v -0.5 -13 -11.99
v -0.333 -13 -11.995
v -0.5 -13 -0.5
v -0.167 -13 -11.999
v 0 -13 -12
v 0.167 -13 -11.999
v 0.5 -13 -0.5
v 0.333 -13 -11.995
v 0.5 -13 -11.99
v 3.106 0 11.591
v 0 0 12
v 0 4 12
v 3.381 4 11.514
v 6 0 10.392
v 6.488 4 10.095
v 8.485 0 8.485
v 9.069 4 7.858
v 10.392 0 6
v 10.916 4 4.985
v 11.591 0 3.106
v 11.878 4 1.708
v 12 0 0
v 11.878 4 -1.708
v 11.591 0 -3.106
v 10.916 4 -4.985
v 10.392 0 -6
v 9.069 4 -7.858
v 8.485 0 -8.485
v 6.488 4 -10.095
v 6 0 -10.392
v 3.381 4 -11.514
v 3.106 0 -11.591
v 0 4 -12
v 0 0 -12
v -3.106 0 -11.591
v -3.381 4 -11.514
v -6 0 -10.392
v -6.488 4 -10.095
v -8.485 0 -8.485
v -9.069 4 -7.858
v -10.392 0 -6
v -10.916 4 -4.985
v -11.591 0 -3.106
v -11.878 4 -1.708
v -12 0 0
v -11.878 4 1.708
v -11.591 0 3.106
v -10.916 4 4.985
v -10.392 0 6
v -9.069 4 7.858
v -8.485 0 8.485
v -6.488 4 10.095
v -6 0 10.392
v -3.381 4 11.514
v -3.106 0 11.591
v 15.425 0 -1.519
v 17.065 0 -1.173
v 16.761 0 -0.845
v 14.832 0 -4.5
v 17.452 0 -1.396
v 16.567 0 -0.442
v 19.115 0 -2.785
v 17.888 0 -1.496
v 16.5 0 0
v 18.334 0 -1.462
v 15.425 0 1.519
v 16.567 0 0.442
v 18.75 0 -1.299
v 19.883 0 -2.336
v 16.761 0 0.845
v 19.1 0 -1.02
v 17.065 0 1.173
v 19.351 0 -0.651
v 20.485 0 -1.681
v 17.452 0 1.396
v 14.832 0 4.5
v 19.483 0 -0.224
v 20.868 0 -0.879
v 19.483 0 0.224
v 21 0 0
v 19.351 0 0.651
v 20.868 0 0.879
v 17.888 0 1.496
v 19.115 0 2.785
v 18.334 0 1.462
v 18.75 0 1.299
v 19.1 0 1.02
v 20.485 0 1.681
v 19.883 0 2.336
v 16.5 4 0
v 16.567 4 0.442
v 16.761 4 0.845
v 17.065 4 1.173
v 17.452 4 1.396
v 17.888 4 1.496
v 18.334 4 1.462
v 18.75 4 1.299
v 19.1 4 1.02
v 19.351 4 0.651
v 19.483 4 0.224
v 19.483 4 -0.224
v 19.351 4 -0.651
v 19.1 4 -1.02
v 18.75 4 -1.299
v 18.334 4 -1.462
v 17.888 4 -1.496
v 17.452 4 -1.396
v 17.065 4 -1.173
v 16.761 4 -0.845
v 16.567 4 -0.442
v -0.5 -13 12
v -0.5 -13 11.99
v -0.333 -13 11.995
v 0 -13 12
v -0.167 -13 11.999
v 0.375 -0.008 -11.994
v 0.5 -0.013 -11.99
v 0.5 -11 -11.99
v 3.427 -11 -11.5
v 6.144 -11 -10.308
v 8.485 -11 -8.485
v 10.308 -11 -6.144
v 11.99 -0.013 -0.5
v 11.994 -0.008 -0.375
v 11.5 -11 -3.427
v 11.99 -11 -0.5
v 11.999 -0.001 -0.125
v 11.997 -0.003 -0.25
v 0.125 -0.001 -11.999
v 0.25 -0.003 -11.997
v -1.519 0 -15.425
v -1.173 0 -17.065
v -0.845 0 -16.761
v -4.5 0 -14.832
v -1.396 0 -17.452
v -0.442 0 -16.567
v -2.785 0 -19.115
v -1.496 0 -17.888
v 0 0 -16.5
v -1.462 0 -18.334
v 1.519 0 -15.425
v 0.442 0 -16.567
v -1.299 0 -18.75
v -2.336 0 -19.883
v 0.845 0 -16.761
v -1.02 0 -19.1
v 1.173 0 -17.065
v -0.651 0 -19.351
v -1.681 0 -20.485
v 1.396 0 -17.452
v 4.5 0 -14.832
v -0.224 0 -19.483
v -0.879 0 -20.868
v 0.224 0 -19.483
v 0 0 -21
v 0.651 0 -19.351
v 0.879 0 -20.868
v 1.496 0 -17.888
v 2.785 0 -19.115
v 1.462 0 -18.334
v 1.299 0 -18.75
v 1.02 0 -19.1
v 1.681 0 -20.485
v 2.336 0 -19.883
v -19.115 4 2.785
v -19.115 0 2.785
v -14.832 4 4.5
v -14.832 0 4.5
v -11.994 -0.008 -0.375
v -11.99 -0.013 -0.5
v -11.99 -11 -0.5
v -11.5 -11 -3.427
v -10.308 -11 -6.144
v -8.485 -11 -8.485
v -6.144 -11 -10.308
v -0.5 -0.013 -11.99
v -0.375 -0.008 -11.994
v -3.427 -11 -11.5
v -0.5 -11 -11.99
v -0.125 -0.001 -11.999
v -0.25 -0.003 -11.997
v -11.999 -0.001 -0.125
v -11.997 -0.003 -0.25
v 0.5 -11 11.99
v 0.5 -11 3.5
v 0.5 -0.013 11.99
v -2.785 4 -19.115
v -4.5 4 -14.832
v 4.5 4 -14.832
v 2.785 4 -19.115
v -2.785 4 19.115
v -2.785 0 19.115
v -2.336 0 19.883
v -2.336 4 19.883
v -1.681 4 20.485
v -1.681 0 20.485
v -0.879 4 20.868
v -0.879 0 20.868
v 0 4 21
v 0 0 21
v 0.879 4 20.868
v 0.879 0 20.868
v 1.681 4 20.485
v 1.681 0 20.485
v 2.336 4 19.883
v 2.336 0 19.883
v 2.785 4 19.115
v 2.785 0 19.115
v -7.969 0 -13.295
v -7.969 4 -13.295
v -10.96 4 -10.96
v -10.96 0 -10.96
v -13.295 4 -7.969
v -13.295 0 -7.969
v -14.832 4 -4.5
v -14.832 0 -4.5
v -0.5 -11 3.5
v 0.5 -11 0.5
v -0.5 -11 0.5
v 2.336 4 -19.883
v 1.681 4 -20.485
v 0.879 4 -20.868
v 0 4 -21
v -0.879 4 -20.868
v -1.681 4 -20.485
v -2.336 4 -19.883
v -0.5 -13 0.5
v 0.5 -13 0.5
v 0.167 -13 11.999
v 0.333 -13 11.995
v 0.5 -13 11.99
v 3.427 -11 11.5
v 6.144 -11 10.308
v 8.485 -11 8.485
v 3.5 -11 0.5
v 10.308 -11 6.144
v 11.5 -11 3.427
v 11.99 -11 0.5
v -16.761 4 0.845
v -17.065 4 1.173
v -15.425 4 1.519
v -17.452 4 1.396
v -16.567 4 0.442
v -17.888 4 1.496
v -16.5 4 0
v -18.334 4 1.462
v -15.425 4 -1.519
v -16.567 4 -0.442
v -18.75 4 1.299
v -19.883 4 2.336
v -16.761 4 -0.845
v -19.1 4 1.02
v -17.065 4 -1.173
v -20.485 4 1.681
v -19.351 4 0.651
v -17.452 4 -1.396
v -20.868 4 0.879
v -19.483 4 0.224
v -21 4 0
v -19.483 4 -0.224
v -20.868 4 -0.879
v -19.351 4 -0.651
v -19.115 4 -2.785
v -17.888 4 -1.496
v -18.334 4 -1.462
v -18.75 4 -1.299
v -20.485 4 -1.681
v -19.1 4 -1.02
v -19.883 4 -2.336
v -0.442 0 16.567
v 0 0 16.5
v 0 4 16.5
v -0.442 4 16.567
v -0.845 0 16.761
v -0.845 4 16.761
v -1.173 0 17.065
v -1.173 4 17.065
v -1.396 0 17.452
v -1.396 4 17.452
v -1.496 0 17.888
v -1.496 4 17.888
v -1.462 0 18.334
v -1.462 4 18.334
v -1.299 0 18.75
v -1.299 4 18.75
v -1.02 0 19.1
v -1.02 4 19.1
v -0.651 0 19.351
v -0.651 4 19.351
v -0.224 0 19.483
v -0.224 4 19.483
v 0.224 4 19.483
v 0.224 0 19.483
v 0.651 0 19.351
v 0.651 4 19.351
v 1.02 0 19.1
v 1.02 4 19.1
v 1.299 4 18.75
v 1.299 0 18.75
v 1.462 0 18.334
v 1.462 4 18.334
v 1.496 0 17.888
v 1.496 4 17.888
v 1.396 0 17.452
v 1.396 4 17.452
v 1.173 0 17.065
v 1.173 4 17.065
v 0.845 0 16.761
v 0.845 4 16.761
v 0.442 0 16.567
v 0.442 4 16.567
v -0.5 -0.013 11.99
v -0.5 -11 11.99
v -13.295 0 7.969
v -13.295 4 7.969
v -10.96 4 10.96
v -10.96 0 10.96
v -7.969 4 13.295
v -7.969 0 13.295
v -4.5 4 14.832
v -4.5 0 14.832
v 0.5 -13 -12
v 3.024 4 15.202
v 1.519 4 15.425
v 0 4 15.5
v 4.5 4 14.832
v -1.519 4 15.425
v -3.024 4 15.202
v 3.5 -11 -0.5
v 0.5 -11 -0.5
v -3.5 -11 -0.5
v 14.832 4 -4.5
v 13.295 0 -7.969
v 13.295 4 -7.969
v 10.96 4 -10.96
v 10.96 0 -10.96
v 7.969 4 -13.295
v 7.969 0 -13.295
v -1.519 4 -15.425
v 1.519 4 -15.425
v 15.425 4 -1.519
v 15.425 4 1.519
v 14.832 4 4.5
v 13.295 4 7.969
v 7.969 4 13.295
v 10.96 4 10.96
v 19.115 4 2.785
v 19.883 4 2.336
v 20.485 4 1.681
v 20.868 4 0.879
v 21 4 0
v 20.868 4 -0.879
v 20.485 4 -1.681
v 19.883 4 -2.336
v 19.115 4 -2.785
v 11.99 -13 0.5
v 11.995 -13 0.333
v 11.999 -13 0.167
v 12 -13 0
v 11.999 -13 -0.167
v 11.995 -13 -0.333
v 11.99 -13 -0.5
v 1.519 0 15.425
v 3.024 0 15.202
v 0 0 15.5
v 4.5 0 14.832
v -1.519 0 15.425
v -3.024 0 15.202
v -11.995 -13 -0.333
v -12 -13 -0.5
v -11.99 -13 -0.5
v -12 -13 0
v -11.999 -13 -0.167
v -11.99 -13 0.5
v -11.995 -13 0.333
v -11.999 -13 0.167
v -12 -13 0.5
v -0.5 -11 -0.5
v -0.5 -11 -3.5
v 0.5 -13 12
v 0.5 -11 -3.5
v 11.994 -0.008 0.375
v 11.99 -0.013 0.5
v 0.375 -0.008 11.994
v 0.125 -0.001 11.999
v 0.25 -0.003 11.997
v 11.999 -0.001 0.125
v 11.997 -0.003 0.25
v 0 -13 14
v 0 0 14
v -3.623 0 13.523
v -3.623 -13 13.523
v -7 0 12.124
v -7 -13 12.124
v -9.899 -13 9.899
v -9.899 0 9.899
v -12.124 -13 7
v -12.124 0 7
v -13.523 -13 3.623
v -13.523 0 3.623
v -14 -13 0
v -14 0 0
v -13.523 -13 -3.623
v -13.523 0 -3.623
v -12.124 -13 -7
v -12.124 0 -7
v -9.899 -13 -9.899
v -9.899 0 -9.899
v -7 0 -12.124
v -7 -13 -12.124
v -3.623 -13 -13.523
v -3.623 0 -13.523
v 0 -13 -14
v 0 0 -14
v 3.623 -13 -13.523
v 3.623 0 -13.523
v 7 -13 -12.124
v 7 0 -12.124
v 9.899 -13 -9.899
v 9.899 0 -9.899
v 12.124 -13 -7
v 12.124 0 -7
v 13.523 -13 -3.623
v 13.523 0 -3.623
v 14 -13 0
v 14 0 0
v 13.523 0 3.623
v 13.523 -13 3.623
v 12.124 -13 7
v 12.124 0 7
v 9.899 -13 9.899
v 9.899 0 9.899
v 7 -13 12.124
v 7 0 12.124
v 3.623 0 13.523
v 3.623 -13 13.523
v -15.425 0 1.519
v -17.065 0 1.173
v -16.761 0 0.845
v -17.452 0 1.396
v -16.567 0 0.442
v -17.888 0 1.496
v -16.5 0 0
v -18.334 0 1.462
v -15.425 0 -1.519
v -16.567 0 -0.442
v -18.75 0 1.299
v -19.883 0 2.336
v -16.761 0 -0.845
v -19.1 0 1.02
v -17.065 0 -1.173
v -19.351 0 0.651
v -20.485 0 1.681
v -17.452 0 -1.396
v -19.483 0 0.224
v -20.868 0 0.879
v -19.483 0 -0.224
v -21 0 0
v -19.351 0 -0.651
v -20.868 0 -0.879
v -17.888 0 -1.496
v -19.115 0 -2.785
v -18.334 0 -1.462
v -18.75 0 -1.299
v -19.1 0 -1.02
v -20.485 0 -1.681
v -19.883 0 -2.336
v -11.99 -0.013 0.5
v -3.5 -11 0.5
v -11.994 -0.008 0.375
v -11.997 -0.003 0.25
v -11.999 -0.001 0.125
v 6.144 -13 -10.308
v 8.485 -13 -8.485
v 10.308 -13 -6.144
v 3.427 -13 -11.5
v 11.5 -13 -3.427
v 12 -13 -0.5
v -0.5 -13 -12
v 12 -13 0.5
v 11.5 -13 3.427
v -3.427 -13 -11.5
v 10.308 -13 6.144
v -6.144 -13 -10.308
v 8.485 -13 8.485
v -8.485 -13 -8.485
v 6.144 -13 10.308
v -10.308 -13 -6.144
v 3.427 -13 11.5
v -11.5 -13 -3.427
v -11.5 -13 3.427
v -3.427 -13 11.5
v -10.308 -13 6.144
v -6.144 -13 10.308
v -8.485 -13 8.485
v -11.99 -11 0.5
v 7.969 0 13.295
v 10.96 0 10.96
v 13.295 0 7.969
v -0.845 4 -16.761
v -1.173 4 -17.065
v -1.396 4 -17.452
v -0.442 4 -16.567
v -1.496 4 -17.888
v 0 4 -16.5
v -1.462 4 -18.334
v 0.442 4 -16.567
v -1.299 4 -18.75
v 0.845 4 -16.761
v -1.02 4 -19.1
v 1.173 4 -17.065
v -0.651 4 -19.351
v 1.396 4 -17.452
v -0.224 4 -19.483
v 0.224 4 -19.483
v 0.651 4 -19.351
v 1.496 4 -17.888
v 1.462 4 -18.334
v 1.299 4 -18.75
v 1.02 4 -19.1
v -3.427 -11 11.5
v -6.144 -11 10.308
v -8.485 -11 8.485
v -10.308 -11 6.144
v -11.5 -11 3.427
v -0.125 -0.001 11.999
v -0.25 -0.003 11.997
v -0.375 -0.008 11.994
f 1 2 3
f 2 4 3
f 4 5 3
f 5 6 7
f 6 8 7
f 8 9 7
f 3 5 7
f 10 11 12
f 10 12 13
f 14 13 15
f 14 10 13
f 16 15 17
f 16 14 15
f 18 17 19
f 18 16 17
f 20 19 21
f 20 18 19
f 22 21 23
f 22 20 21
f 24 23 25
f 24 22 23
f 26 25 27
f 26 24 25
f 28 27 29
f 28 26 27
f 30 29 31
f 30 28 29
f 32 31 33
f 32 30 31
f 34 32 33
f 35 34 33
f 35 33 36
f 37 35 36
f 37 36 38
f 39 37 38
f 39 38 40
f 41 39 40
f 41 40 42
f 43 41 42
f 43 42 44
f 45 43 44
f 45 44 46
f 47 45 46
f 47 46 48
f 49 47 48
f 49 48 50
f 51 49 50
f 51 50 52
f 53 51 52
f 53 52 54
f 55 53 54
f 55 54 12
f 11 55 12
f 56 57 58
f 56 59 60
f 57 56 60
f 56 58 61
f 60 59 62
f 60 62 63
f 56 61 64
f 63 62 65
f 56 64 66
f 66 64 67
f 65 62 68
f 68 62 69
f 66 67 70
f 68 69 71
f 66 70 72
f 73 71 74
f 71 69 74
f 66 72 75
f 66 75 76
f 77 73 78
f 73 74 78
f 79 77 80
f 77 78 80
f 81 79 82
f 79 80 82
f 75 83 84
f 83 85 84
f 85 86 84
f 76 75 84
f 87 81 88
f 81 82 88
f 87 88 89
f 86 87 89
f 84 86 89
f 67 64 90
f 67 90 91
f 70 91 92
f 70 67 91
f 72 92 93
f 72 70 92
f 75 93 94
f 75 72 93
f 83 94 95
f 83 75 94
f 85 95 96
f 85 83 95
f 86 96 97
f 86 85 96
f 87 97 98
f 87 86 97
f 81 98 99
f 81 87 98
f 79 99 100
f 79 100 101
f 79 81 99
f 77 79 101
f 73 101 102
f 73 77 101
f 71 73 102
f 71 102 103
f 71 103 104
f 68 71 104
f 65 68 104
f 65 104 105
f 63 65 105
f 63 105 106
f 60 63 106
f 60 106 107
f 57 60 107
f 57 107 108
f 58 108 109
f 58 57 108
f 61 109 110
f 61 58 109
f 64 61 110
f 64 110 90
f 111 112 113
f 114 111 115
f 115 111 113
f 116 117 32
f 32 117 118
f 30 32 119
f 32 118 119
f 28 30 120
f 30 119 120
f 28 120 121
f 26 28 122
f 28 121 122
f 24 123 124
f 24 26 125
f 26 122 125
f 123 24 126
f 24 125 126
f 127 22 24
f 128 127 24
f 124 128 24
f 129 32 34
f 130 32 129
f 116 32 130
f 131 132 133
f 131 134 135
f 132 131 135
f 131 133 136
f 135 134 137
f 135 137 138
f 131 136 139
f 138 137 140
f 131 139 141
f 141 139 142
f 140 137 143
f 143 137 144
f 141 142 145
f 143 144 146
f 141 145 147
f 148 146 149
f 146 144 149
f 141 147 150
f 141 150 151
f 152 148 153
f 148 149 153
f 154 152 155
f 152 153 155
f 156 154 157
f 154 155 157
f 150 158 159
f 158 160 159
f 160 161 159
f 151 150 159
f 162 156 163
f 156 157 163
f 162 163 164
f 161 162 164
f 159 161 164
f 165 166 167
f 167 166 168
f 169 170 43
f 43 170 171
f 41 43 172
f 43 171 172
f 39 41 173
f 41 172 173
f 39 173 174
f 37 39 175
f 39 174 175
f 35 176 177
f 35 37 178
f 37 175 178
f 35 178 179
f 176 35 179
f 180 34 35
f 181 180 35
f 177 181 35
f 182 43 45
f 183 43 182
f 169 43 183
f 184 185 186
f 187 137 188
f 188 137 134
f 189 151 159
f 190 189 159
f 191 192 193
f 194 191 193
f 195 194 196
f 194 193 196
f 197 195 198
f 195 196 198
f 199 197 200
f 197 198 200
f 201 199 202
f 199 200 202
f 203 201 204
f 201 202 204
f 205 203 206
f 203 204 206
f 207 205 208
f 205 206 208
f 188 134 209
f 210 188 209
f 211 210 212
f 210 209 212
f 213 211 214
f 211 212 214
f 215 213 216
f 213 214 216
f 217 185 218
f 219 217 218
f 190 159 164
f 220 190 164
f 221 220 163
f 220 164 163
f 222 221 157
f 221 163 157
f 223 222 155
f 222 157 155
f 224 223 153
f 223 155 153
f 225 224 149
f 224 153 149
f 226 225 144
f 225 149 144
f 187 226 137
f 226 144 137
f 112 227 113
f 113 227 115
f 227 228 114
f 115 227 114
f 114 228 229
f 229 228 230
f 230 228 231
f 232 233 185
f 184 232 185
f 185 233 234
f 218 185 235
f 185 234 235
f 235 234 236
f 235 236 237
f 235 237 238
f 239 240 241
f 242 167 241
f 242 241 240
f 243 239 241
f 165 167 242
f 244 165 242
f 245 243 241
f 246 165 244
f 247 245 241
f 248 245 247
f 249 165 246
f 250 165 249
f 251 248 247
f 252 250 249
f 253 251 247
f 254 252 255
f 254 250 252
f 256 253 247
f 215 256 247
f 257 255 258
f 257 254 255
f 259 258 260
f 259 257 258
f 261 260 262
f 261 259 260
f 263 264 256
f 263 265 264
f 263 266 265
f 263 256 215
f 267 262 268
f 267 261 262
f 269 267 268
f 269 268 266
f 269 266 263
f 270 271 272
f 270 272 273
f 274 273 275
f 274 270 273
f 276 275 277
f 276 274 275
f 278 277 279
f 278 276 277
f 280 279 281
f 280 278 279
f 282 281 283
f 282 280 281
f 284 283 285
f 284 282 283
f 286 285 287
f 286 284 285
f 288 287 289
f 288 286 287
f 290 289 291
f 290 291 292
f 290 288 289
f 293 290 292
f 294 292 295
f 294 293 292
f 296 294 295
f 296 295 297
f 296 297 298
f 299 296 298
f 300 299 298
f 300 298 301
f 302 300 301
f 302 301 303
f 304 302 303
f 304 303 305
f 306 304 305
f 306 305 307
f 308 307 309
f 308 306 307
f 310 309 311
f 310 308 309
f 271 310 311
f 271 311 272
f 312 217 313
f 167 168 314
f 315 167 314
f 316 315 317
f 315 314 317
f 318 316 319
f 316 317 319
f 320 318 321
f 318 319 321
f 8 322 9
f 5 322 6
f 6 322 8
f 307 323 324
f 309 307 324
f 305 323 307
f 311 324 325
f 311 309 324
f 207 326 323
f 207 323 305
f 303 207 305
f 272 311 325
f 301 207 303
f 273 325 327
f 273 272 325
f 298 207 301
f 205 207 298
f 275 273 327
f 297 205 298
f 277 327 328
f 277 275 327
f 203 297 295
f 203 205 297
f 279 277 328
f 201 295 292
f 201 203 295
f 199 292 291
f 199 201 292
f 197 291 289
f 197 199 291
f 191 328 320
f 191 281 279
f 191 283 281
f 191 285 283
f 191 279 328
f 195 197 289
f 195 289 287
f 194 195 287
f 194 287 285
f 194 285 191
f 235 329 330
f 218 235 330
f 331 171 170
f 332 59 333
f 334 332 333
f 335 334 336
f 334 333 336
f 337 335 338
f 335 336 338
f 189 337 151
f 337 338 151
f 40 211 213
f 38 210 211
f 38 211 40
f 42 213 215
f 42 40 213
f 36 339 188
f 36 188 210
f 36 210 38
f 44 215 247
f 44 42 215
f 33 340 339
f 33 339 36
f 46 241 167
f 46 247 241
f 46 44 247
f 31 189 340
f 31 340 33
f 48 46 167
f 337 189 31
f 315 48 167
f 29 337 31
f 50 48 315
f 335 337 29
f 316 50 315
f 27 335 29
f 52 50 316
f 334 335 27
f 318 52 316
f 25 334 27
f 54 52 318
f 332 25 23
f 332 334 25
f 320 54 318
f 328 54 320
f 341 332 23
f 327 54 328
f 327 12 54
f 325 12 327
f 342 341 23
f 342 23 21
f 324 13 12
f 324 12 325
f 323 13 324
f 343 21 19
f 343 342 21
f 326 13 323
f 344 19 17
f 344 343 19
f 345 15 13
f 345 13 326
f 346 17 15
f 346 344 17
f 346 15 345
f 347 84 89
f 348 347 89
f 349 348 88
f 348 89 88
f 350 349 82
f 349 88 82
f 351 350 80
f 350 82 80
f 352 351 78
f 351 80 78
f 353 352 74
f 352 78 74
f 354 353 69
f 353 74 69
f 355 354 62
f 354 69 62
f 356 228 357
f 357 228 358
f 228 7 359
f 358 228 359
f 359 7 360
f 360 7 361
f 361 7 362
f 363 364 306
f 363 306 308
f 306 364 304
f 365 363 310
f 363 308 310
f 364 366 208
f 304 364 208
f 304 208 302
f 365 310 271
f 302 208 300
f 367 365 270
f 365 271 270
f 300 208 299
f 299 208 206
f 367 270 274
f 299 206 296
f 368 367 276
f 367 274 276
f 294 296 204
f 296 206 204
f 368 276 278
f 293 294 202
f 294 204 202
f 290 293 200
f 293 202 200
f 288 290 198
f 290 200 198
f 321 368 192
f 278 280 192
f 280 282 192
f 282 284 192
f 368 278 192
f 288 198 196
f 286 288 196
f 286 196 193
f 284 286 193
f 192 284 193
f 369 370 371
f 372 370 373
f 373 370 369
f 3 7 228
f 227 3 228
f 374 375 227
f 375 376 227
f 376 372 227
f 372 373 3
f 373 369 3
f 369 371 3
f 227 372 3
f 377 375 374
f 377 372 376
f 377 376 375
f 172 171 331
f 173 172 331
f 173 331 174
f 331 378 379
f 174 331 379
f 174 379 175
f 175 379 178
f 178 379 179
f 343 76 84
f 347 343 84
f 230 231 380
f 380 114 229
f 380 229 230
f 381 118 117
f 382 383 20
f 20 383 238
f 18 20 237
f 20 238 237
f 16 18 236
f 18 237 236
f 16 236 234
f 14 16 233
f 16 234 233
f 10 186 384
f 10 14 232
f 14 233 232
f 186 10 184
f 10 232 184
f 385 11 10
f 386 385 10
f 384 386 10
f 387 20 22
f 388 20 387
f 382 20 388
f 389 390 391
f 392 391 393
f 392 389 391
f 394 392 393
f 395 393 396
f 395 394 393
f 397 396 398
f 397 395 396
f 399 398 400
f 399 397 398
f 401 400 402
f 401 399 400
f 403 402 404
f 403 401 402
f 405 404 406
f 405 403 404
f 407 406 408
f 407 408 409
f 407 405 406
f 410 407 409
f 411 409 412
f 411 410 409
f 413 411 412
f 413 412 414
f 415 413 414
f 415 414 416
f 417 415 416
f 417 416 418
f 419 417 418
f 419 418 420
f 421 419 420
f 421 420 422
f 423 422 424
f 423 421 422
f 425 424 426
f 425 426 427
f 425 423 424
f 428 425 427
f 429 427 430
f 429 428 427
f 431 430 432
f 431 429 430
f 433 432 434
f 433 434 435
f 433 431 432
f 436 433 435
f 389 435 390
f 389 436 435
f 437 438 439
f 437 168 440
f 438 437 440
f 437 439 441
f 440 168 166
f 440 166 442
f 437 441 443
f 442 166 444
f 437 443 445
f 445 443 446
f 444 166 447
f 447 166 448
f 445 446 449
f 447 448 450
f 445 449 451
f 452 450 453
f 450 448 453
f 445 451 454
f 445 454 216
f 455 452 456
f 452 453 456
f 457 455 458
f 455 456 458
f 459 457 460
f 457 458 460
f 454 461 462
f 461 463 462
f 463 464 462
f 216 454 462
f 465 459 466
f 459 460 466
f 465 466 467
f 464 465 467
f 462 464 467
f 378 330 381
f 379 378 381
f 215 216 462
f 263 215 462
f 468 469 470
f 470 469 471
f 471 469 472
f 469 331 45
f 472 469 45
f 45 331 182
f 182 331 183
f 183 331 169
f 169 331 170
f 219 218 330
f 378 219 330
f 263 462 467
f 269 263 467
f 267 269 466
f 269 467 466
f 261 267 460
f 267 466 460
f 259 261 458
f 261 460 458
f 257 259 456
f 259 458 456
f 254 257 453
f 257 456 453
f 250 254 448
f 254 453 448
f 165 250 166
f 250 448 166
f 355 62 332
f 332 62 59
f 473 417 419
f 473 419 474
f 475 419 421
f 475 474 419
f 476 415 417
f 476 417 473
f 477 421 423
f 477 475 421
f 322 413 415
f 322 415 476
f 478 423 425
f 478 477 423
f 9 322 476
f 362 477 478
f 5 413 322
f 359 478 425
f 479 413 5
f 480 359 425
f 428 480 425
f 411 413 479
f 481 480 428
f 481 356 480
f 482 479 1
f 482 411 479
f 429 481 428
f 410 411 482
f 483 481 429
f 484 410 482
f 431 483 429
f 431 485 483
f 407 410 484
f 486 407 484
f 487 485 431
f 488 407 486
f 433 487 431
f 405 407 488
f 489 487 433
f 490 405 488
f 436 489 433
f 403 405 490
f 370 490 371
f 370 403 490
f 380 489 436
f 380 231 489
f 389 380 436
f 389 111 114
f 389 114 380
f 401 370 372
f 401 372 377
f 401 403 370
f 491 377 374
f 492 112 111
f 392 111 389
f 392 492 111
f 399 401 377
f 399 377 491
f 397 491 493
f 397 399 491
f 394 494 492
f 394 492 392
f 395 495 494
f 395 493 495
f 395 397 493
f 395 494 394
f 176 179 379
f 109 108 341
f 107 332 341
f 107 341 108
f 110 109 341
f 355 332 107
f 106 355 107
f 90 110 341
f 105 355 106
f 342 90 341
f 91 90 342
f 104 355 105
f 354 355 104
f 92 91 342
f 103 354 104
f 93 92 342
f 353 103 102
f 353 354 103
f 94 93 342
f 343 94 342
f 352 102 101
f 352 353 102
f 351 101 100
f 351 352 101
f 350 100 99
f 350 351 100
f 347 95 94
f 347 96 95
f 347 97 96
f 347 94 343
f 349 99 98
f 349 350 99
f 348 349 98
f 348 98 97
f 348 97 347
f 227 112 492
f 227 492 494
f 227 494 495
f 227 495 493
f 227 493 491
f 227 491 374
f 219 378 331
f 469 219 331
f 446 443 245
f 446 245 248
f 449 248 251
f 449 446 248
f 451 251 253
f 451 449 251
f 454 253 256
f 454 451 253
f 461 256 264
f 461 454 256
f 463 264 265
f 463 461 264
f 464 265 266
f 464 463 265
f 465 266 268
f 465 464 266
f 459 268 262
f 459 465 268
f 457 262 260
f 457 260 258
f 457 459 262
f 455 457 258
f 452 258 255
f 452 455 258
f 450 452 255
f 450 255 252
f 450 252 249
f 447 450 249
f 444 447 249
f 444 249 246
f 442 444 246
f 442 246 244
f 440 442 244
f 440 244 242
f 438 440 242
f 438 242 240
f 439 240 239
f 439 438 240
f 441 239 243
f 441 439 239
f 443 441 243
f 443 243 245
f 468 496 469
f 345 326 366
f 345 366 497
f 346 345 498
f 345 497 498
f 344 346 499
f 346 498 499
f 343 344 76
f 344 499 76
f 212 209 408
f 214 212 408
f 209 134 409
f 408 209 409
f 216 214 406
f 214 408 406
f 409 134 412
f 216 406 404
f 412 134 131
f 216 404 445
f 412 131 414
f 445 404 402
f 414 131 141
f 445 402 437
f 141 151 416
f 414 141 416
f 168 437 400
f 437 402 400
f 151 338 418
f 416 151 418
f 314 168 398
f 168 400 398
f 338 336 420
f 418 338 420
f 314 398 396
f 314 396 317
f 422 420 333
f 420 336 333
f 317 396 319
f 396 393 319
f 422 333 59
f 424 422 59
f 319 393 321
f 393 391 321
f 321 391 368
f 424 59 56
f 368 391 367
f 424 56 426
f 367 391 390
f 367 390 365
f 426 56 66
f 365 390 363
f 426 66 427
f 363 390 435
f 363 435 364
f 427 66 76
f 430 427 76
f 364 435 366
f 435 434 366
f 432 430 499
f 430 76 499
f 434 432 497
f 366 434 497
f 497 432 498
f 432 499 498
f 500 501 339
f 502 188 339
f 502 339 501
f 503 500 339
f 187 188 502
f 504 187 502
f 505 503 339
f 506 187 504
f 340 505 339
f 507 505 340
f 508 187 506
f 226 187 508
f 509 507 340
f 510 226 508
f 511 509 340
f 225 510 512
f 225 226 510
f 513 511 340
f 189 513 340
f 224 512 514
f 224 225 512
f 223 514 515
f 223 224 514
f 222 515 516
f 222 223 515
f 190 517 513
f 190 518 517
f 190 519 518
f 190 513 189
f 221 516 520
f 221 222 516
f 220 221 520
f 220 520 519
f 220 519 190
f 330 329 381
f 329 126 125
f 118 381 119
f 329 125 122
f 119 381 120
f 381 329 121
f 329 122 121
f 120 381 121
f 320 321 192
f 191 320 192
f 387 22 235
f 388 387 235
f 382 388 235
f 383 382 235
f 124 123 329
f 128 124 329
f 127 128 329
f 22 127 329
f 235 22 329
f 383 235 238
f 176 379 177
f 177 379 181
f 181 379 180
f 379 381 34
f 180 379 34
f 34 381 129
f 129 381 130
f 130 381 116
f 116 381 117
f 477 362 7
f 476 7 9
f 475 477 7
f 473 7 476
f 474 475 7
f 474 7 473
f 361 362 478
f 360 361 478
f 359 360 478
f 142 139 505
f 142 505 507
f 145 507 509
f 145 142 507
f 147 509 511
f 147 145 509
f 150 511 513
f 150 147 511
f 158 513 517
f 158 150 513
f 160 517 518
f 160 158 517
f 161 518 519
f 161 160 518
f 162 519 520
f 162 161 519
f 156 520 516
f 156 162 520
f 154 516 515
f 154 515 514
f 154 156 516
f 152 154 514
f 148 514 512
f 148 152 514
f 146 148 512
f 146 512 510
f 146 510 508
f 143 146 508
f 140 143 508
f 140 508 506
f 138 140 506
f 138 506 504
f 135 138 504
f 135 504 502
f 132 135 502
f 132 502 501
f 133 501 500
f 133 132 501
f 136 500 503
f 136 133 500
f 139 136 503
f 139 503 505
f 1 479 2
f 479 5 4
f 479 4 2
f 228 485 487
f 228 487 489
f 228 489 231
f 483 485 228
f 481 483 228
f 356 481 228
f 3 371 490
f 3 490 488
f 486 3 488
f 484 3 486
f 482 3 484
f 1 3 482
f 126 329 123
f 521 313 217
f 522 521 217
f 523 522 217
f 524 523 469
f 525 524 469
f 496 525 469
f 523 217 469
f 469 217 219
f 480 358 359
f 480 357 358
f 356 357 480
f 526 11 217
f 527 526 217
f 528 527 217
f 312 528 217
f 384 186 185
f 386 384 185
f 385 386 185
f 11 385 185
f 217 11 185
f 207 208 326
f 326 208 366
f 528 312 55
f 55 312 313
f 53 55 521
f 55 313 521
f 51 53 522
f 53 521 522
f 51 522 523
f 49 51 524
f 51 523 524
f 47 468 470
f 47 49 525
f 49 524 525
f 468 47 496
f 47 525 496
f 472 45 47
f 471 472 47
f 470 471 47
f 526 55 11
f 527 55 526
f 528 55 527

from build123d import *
from build123d.topology import SkipClean

# Parameters (mm, degrees)
SKETCH1_R           = 15.5
SKETCH1_R_2         = 12
BOSS_EXTRUDE1_DEPTH = 4
BOSS_EXTRUDE2_START = 13
SKETCH2_R           = 14
SKETCH2_R_2         = 12
BOSS_EXTRUDE2_DEPTH = 13
BOSS_EXTRUDE3_DEPTH = 0.5
CIRPATTERN1_COUNT   = 4
BOSS_EXTRUDE4_START = -4
SKETCH4_R           = 1.5
BOSS_EXTRUDE4_DEPTH = 4
CIRPATTERN2_COUNT   = 4
SKETCH5_R           = 12
BOSS_EXTRUDE5_DEPTH = 2


with BuildPart() as part:
    # Sketch1 → Boss-Extrude1 (new body)
    with BuildSketch(Plane(origin=(0, 0, 0), x_dir=(1, 0, 0), z_dir=(0, 1, 0))):
        with Locations(Location((0, 0, 0), (0, 0, 270))):
            Circle(SKETCH1_R)
        with Locations(Location((0, 0, 0), (0, 0, 270))):
            Circle(SKETCH1_R_2, mode=Mode.SUBTRACT)
    extrude(amount=BOSS_EXTRUDE1_DEPTH)

    # Sketch2 → Boss-Extrude2 (add)
    with SkipClean():  # the faces are left unmerged after this step: merging them gives an invalid solid
        with BuildSketch(Plane.XZ.offset(BOSS_EXTRUDE2_START)):
            with Locations(Location((0, 0, 0), (0, 0, 90))):
                Circle(SKETCH2_R)
            with Locations(Location((0, 0, 0), (0, 0, 270))):
                Circle(SKETCH2_R_2, mode=Mode.SUBTRACT)
        extrude(amount=-BOSS_EXTRUDE2_DEPTH)

    # Sketch3 → Boss-Extrude3 (add, symmetric)
    with SkipClean():  # the faces are left unmerged after this step: merging them gives an invalid solid
        with BuildSketch(Plane(origin=(0, 0, 0), x_dir=(0, 0, -1), z_dir=(1, 0, 0))):
            Polygon((-12, 0), (-3.5, -11), (3.5, -11), (12, 0), (12, -13), (-12, -13), align=None)
        boss_extrude3 = extrude(amount=BOSS_EXTRUDE3_DEPTH, both=True)

    # CirPattern1: Boss-Extrude3 ×4 about axis
    with SkipClean():  # the faces are left unmerged after this step: merging them gives an invalid solid
        cirpattern1_axis = Axis((0, 0, 0), (0, 1, 0))
        for i in range(1, CIRPATTERN1_COUNT):
            add(boss_extrude3.rotate(cirpattern1_axis, i * 360 / CIRPATTERN1_COUNT))

    # Sketch4 → Boss-Extrude4 (add)
    with SkipClean():  # the faces are left unmerged after this step: merging them gives an invalid solid
        with BuildSketch(Plane(origin=(0, 4, 0), x_dir=(1, 0, 0), z_dir=(0, 1, 0)).offset(BOSS_EXTRUDE4_START)):
            with BuildLine():
                Line((-2.785012774, 19.115214709), (-4.5, 14.832396974))
                ThreePointArc((-4.5, 14.832396974), (0, 15.5), (4.5, 14.832396974))
                Line((4.5, 14.832396974), (2.785012774, 19.115214709))
                ThreePointArc((2.785012774, 19.115214709), (0, 21), (-2.785012774, 19.115214709))
            make_face()
            with Locations(Location((0, 18, 0), (0, 0, 270))):
                Circle(SKETCH4_R, mode=Mode.SUBTRACT)
        boss_extrude4 = extrude(amount=BOSS_EXTRUDE4_DEPTH)

    # CirPattern2: Boss-Extrude4 ×4 about axis
    with SkipClean():  # the faces are left unmerged after this step: merging them gives an invalid solid
        cirpattern2_axis = Axis((0, 0, 0), (0, 1, 0))
        for i in range(1, CIRPATTERN2_COUNT):
            add(boss_extrude4.rotate(cirpattern2_axis, i * 360 / CIRPATTERN2_COUNT))

    # Sketch5 → Boss-Extrude5 (add)
    with SkipClean():  # the faces are left unmerged after this step: merging them gives an invalid solid
        with BuildSketch(Plane.XZ.offset(13)):
            with Locations(Location((0, 0, 0), (0, 0, 267.611984537))):
                Circle(SKETCH5_R)
        extrude(amount=-BOSS_EXTRUDE5_DEPTH)


solid = part.part
